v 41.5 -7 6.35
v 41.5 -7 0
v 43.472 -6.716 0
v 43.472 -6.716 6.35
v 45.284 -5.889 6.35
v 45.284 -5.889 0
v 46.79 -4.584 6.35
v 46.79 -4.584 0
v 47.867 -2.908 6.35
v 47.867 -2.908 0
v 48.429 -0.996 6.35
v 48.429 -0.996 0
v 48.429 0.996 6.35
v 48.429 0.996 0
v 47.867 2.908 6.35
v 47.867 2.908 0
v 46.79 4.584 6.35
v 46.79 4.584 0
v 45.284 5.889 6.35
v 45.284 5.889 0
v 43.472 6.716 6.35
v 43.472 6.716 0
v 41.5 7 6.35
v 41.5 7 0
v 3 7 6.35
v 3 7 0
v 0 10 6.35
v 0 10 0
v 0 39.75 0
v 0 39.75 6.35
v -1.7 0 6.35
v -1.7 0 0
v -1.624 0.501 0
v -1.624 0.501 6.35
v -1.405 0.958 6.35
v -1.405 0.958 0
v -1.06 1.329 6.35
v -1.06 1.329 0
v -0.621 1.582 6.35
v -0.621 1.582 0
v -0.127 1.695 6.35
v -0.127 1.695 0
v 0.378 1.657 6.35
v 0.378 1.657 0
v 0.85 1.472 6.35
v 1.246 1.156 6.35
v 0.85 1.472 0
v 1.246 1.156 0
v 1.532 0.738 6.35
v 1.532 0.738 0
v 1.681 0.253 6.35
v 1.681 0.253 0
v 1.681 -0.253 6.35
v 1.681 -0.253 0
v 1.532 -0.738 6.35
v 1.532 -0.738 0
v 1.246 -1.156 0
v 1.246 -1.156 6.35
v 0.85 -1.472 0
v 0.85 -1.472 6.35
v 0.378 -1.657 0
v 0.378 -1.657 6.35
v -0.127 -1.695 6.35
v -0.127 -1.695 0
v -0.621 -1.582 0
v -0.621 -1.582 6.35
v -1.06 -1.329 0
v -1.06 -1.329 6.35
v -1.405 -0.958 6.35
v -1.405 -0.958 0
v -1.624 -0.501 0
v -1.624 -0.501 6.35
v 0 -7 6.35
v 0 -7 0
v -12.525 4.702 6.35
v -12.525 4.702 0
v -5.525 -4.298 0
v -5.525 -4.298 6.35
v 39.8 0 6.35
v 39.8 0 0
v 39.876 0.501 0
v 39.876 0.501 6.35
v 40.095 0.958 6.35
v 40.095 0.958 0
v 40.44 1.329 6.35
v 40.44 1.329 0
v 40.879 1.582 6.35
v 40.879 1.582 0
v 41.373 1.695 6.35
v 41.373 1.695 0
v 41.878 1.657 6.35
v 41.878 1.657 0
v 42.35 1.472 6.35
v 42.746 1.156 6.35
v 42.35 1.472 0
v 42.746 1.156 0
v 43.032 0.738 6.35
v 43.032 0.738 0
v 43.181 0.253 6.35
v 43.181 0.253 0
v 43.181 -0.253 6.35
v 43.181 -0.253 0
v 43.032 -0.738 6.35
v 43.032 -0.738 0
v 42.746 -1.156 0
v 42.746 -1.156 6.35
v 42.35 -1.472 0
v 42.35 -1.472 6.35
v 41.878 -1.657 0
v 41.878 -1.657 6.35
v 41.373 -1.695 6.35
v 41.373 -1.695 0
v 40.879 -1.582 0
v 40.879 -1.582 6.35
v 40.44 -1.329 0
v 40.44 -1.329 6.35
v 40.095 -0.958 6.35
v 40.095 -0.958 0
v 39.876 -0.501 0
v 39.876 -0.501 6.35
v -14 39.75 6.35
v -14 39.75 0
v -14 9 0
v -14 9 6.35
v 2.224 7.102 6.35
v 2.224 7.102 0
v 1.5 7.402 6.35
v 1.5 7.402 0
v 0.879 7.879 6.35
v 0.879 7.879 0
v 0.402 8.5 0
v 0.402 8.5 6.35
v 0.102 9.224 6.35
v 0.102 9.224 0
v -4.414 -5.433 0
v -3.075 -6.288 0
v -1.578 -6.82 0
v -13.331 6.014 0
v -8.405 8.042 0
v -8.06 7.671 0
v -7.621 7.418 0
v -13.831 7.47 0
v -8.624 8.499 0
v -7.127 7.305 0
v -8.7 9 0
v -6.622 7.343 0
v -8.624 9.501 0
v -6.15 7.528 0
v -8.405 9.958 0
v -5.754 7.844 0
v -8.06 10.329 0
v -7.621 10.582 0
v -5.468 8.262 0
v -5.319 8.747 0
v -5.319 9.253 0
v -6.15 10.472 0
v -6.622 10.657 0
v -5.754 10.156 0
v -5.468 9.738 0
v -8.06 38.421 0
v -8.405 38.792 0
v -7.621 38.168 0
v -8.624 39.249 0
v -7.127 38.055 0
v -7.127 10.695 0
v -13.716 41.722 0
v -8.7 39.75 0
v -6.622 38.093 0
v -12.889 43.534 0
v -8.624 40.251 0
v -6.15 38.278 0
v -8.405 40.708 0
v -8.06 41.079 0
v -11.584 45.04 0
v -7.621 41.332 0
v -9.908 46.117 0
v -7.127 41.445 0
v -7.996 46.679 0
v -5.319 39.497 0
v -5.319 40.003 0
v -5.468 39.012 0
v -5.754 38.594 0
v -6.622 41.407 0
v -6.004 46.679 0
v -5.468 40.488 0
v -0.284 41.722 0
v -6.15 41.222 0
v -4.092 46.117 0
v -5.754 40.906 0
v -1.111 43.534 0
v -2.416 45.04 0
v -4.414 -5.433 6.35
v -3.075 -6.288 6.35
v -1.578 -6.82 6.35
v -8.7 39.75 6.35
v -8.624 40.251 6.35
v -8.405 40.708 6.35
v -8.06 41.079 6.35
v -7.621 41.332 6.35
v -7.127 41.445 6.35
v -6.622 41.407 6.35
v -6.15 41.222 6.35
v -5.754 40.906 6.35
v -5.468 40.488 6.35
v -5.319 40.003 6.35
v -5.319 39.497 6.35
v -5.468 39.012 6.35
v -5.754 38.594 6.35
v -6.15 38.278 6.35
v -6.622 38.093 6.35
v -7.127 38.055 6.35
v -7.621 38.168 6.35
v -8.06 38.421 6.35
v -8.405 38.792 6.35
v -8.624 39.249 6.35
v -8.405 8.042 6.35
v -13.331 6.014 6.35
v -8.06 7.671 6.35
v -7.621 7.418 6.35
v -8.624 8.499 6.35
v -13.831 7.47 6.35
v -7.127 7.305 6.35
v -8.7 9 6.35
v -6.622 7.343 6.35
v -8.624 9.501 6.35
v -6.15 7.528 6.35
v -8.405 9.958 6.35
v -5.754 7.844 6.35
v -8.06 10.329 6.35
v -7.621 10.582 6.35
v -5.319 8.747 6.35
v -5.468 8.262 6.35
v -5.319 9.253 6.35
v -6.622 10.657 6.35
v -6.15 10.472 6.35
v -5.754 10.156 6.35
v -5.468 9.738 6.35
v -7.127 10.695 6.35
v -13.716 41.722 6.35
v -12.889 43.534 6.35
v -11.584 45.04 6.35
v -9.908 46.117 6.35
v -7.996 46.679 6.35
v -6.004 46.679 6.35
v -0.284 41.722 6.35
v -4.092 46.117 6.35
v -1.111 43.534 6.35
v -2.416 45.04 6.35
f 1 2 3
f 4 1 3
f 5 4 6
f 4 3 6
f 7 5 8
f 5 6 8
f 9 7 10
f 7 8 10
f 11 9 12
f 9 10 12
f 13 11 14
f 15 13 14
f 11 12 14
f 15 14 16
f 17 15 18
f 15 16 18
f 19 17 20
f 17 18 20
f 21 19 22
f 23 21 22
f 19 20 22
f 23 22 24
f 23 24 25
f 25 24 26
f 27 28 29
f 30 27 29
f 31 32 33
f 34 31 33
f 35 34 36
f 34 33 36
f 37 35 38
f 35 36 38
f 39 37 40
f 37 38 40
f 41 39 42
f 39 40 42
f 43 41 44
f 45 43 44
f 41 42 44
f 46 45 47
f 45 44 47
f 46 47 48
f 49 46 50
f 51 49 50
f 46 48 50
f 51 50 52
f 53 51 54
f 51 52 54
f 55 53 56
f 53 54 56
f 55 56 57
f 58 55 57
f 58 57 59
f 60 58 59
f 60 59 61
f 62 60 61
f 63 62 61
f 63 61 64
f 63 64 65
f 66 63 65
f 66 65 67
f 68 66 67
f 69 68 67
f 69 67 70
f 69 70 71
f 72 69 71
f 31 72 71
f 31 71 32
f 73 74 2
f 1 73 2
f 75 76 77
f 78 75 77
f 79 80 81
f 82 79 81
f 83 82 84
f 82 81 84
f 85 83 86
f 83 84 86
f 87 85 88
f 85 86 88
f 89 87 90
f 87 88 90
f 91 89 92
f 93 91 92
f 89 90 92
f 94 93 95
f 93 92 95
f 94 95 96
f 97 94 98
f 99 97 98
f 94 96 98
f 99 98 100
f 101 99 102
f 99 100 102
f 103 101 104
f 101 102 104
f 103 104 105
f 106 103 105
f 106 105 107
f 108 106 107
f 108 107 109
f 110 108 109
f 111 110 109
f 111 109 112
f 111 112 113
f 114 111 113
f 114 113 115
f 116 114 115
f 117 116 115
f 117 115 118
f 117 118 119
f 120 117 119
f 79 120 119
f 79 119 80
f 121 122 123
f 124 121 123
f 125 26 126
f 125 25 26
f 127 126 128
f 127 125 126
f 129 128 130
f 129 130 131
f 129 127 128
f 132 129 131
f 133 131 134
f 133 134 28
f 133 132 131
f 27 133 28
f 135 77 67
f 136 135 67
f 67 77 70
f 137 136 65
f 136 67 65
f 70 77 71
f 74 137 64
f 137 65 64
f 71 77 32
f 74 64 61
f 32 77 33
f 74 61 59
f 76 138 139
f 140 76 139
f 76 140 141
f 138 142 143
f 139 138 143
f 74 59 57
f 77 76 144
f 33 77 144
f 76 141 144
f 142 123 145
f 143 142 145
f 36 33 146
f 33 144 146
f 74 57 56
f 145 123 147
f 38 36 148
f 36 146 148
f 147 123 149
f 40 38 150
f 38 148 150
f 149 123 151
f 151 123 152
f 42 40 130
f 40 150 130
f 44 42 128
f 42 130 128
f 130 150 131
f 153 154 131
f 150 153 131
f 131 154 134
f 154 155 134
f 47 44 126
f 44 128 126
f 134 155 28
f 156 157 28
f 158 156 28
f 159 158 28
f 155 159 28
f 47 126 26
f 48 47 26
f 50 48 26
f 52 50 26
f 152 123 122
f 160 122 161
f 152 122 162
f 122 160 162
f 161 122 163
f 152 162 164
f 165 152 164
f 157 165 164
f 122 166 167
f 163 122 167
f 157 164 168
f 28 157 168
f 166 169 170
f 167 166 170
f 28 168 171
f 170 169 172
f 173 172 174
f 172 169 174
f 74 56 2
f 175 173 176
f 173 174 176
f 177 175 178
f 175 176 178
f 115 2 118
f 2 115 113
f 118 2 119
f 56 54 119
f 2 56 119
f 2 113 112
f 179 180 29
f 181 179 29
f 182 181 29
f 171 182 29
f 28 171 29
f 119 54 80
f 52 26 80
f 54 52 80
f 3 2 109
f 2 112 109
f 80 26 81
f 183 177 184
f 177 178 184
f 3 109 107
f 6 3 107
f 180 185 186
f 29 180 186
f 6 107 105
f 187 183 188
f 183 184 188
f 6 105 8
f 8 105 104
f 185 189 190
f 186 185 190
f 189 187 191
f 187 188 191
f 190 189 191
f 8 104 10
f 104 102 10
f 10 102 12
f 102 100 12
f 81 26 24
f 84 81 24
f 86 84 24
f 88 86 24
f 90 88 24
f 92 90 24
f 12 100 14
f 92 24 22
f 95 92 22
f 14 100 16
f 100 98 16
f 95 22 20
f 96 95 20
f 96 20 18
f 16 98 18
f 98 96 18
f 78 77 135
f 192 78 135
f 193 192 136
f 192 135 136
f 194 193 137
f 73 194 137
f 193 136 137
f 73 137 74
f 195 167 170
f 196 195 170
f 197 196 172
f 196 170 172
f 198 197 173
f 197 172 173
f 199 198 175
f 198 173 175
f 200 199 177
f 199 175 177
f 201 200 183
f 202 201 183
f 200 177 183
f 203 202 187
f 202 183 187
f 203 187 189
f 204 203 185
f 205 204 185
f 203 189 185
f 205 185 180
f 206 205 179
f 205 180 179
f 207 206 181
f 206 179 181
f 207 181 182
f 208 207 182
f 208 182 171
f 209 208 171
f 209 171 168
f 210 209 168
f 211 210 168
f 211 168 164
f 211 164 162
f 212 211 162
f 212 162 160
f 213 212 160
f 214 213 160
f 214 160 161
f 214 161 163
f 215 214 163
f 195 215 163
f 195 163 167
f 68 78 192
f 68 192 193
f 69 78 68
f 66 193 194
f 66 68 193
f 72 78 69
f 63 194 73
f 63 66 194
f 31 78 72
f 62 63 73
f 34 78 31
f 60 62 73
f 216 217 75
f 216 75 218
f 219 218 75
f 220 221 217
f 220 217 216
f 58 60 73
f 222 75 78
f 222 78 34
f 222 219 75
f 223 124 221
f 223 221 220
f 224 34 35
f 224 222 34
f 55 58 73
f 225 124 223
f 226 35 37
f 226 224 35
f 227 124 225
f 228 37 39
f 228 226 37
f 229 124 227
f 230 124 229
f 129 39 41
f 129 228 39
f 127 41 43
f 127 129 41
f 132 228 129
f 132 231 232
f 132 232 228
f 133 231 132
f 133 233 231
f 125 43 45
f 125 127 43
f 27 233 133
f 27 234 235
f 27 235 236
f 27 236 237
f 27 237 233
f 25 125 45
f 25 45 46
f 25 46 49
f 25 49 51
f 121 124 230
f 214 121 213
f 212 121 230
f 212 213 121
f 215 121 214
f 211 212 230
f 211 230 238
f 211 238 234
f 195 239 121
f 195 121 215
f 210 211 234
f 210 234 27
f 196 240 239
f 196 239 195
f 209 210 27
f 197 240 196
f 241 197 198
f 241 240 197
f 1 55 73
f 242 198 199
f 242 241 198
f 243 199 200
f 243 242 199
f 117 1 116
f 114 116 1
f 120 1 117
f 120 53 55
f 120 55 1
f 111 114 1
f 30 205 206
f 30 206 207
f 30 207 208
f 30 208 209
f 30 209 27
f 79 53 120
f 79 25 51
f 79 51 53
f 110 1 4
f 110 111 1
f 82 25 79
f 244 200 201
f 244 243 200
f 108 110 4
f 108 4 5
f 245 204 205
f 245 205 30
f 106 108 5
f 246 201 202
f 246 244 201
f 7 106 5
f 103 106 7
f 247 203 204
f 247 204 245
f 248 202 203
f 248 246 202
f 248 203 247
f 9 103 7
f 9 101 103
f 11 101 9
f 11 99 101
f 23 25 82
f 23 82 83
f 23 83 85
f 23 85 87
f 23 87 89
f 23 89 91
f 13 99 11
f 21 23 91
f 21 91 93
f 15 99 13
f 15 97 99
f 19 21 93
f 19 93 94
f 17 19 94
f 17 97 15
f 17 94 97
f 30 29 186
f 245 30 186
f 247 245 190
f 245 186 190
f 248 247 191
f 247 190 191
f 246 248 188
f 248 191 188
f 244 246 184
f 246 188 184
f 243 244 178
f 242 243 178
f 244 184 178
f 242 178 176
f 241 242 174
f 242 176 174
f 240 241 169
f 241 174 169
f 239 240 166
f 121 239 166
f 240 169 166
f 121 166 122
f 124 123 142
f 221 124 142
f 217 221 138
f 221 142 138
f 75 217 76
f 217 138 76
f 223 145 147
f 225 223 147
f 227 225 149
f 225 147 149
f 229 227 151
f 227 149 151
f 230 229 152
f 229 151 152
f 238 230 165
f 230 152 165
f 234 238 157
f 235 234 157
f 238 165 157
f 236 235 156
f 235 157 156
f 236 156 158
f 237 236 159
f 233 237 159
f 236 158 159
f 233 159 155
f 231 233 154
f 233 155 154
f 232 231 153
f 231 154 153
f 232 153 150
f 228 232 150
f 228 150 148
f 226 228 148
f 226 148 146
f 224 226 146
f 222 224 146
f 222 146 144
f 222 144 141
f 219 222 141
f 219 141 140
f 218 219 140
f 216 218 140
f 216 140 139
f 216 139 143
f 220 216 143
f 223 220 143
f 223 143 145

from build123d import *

# Parameters (mm, degrees)
BOSS_EXTRUDE1_DEPTH  = 6.35
FILLET1_R            = 3
M3_CLEARANCE_HOLE1_D = 3.4


with BuildPart() as part:
    # Sketch2 → Boss-Extrude1 (new body)
    with BuildSketch(Plane.XY):
        with BuildLine():
            Line((-14, 39.75), (-14, 9))
            ThreePointArc((-14, 9), (-13.621112393, 6.728245023), (-12.525465522, 4.702415705))
            Line((-12.525465522, 4.702415705), (-5.525465522, -4.297584295))
            ThreePointArc((-5.525465522, -4.297584295), (-3.075460123, -6.288206822), (0, -7))
            Line((0, -7), (41.5, -7))
            ThreePointArc((41.5, -7), (48.5, 0), (41.5, 7))
            Line((41.5, 7), (0, 7))
            Line((0, 7), (0, 39.75))
            ThreePointArc((0, 39.75), (-7, 46.75), (-14, 39.75))
        make_face()
    extrude(amount=BOSS_EXTRUDE1_DEPTH)

    # Fillet1
    fillet1_edges = [part.edges().sort_by_distance(p)[0] for p in [
        (0, 7, 3.175),
    ]]
    fillet(fillet1_edges, radius=FILLET1_R)

    # M3 Clearance Hole1 (through all)
    with Locations(Plane.XY.offset(6.35)):
        with Locations((-7, 39.75), (-7, 9), (0, 0), (41.5, 0)):
            Hole(M3_CLEARANCE_HOLE1_D / 2)


solid = part.part
